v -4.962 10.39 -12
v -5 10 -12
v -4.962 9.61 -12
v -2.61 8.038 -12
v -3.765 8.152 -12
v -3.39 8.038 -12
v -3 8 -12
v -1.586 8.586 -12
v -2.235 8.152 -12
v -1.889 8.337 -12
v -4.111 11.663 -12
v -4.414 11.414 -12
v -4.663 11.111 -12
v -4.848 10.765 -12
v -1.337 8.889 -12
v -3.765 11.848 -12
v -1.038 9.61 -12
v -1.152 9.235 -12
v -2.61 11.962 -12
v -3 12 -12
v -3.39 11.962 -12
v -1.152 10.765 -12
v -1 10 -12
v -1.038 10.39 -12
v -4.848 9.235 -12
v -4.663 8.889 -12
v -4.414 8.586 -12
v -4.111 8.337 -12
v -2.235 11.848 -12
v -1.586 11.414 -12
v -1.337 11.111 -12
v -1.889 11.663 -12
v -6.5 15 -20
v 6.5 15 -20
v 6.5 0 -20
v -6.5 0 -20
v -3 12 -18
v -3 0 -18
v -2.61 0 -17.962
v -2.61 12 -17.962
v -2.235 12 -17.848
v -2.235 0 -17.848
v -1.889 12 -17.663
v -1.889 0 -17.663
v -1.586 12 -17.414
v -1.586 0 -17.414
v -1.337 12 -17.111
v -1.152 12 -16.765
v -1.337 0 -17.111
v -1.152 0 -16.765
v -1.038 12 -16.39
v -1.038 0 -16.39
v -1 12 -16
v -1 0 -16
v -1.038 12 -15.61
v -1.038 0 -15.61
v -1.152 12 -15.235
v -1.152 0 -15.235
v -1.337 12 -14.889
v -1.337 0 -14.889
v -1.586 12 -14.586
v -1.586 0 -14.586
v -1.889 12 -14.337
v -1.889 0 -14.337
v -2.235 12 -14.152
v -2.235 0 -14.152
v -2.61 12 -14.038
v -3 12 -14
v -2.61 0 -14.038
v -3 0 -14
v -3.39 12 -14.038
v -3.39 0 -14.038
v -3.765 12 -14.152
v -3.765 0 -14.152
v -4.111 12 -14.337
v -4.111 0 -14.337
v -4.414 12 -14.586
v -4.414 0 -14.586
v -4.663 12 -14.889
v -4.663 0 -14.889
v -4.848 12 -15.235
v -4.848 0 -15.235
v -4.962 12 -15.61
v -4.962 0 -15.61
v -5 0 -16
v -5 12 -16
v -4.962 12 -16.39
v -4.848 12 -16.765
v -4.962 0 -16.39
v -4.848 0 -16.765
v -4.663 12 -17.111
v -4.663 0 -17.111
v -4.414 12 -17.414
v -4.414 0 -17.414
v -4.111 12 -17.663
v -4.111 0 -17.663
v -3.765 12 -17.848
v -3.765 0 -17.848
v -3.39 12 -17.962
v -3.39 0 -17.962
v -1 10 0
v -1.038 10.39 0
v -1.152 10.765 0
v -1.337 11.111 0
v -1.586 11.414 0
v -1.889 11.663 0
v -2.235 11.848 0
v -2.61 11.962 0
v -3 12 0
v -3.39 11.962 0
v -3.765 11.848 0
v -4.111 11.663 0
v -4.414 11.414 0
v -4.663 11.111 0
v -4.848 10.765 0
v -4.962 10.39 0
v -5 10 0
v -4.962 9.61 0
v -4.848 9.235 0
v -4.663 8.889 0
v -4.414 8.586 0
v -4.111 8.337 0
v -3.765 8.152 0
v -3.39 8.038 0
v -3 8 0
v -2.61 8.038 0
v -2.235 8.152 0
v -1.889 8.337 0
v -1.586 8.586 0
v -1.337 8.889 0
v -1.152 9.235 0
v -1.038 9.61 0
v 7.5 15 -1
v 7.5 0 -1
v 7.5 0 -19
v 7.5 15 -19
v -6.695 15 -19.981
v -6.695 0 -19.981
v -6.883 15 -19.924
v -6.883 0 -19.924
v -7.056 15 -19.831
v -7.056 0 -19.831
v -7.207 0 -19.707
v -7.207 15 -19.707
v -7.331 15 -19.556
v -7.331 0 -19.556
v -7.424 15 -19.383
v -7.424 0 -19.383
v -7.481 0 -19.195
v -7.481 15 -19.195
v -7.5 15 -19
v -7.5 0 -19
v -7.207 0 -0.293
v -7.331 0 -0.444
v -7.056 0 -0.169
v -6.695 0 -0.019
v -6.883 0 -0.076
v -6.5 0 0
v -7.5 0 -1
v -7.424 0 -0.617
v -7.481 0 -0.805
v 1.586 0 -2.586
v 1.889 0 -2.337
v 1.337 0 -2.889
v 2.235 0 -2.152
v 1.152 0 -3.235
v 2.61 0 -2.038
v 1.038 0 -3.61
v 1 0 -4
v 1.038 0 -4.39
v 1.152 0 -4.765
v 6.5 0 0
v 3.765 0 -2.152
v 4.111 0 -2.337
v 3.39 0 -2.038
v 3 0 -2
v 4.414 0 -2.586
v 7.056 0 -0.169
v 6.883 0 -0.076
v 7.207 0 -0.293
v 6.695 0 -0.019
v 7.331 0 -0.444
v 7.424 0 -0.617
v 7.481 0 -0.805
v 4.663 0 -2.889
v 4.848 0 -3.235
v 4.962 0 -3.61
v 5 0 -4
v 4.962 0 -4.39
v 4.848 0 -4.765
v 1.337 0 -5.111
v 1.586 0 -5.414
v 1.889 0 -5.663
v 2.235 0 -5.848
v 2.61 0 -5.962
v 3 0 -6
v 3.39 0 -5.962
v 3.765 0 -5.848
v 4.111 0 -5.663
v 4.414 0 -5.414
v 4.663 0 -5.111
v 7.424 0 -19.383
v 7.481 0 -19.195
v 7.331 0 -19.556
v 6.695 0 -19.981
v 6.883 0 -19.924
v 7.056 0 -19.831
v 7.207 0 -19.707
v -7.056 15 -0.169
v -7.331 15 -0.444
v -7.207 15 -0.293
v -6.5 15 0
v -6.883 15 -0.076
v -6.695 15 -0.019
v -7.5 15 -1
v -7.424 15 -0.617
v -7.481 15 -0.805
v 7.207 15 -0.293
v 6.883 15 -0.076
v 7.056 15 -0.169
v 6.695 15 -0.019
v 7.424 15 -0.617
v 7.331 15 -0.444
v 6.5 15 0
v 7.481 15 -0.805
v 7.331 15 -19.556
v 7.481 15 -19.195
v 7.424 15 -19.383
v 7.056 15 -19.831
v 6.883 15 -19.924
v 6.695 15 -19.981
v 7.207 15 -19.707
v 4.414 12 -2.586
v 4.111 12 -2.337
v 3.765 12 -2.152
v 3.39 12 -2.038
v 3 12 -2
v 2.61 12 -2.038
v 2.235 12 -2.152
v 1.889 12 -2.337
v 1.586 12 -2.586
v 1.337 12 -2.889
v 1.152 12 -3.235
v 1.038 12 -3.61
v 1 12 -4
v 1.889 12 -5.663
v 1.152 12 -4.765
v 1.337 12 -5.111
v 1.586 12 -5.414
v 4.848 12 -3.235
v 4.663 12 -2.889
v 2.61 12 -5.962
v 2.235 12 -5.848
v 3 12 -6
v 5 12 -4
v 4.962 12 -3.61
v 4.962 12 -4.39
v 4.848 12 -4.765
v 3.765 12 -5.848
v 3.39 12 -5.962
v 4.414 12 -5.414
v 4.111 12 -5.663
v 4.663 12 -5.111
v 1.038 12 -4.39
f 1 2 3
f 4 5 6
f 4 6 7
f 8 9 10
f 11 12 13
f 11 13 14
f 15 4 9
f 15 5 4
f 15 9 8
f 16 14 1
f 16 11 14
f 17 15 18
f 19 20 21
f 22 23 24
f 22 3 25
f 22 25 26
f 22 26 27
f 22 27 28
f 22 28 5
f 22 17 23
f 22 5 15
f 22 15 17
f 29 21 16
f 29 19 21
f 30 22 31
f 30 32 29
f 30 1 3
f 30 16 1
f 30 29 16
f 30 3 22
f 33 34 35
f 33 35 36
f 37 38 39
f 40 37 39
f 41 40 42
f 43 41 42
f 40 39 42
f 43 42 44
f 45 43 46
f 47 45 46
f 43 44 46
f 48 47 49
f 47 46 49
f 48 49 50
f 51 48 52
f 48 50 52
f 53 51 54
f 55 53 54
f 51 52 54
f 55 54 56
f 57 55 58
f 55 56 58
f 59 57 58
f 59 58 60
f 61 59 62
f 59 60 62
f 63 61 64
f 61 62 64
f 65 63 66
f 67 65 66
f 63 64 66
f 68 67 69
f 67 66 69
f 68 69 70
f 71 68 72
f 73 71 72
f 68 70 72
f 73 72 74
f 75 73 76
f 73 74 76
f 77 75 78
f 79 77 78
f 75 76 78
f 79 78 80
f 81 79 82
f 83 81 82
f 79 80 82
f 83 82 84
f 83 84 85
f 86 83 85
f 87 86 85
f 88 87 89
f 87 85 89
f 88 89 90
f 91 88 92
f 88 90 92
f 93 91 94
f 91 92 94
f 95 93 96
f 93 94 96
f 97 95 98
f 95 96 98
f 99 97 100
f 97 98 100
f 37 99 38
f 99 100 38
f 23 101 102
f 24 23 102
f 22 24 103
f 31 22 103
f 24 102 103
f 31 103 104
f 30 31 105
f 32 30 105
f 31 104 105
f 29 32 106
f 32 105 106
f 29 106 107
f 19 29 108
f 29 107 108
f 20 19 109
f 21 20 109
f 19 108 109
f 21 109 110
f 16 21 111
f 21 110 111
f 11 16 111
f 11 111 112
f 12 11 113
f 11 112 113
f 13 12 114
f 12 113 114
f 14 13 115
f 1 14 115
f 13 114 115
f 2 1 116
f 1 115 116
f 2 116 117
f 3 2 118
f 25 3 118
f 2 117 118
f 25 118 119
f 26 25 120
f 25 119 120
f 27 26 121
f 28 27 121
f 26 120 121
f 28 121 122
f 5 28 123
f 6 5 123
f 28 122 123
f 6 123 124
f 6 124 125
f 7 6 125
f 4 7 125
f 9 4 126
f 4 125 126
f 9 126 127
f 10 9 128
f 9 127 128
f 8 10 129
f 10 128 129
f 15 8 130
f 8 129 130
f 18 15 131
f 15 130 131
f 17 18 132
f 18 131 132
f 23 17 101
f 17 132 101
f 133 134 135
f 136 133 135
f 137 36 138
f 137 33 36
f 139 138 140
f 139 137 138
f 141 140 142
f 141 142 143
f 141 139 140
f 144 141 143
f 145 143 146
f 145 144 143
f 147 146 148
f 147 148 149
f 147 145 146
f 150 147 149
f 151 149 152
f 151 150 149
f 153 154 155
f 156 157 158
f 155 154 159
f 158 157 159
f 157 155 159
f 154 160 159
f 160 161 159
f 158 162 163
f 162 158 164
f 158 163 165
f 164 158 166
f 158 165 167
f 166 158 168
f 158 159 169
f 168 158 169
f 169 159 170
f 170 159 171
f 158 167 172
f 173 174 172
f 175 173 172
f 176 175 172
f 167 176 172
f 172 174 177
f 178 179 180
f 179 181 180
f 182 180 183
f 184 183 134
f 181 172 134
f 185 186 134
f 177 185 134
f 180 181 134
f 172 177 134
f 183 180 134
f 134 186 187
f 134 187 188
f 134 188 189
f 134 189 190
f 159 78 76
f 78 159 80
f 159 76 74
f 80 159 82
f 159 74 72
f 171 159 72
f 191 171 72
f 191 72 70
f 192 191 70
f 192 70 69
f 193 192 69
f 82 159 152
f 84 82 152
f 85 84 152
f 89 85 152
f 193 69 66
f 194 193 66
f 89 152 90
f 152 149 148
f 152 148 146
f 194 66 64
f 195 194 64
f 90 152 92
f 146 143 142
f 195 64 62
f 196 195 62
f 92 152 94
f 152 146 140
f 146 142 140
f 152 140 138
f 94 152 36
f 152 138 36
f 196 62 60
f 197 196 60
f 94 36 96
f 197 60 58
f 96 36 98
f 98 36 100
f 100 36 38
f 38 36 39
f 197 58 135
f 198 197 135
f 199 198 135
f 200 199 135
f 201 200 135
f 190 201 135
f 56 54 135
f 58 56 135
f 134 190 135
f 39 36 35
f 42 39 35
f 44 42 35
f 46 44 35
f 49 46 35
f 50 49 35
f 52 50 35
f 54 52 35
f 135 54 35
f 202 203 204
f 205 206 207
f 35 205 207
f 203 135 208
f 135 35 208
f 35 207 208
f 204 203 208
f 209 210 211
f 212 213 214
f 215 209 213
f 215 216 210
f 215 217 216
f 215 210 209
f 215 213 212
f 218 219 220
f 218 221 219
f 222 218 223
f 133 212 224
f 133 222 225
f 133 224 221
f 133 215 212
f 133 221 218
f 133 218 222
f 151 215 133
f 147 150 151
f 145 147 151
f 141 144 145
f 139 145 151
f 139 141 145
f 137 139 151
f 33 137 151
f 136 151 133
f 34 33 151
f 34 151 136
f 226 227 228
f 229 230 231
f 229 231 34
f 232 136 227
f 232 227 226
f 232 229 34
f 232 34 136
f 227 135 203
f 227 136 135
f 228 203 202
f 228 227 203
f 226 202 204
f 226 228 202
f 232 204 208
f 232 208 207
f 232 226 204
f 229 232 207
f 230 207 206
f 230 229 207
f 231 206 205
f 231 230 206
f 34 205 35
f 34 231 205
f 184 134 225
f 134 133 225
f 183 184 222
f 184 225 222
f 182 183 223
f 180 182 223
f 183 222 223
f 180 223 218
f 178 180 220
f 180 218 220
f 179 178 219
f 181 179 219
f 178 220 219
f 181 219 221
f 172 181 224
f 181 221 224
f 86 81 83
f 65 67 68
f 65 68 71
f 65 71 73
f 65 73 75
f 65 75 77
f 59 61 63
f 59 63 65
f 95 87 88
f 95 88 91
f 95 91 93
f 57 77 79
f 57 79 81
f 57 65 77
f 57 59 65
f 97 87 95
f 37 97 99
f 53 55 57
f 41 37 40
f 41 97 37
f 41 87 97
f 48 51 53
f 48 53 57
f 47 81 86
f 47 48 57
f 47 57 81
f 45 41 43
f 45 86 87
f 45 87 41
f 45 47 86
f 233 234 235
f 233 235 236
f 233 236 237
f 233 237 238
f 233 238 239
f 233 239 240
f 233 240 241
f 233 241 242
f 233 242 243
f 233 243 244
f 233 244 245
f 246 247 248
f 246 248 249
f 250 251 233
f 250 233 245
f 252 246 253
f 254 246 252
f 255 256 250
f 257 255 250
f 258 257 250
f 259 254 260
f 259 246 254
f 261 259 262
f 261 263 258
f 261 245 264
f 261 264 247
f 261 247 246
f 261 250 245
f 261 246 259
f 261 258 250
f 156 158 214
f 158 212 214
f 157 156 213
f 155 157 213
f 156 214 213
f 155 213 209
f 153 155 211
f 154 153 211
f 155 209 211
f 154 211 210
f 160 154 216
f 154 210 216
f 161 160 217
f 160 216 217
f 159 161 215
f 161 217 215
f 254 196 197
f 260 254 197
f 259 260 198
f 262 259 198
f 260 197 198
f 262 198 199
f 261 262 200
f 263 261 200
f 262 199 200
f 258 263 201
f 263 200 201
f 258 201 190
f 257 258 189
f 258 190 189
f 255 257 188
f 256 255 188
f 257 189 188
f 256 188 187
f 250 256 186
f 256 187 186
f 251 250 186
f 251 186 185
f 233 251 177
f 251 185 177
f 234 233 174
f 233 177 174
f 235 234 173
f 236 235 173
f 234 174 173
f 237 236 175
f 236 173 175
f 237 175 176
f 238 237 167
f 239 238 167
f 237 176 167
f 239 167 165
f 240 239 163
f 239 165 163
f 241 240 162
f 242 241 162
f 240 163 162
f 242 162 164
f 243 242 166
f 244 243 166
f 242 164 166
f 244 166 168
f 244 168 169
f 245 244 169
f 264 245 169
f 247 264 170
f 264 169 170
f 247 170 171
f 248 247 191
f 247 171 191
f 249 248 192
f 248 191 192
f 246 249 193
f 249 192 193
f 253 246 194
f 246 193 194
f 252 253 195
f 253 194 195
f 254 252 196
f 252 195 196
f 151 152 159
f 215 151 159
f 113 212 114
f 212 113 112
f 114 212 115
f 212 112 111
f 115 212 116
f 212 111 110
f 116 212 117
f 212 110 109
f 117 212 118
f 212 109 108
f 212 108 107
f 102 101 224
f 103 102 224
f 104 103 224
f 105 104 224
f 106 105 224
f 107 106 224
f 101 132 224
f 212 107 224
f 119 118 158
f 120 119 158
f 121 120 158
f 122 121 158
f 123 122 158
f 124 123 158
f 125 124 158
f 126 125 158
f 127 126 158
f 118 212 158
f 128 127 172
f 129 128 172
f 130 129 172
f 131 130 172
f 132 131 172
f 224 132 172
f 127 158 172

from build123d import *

# Parameters (mm, degrees)
BOSS_EXTRU_1_DEPTH      = 15
ESQUISSE2_R             = 2
ENL_V_MAT_EXTRU_1_DEPTH = 12
ESQUISSE3_R             = 2
ENL_V_MAT_EXTRU_2_DEPTH = 12
CONG_1_R                = 1


with BuildPart() as part:
    # Esquisse1 → Boss.-Extru.1 (new body)
    with BuildSketch(Plane(origin=(0, 0, 0), x_dir=(1, 0, 0), z_dir=(0, 1, 0))):
        Polygon((0, 0), (7.5, 0), (7.5, 20), (-7.5, 20), (-7.5, 0), align=None)
    extrude(amount=BOSS_EXTRU_1_DEPTH)

    # Esquisse2 → Enlèv. mat.-Extru.1 (cut)
    with BuildSketch(Plane.XZ):
        with Locations(Location((-3, -16, 0), (0, 0, 270))):
            Circle(ESQUISSE2_R)
        with Locations(Location((3, -4, 0), (0, 0, 270))):
            Circle(ESQUISSE2_R)
    extrude(amount=-ENL_V_MAT_EXTRU_1_DEPTH, mode=Mode.SUBTRACT)

    # Esquisse3 → Enlèv. mat.-Extru.2 (cut)
    with BuildSketch(Plane.XY):
        with Locations((-3, 10)):
            Circle(ESQUISSE3_R)
    extrude(amount=-ENL_V_MAT_EXTRU_2_DEPTH, mode=Mode.SUBTRACT)

    # Congé1
    cong_1_edges = [part.edges().sort_by_distance(p)[0] for p in [
        (-7.5, 7.5, 0),
        (-7.5, 7.5, -20),
        (7.5, 7.5, -20),
        (7.5, 7.5, 0),
    ]]
    fillet(cong_1_edges, radius=CONG_1_R)


solid = part.part
